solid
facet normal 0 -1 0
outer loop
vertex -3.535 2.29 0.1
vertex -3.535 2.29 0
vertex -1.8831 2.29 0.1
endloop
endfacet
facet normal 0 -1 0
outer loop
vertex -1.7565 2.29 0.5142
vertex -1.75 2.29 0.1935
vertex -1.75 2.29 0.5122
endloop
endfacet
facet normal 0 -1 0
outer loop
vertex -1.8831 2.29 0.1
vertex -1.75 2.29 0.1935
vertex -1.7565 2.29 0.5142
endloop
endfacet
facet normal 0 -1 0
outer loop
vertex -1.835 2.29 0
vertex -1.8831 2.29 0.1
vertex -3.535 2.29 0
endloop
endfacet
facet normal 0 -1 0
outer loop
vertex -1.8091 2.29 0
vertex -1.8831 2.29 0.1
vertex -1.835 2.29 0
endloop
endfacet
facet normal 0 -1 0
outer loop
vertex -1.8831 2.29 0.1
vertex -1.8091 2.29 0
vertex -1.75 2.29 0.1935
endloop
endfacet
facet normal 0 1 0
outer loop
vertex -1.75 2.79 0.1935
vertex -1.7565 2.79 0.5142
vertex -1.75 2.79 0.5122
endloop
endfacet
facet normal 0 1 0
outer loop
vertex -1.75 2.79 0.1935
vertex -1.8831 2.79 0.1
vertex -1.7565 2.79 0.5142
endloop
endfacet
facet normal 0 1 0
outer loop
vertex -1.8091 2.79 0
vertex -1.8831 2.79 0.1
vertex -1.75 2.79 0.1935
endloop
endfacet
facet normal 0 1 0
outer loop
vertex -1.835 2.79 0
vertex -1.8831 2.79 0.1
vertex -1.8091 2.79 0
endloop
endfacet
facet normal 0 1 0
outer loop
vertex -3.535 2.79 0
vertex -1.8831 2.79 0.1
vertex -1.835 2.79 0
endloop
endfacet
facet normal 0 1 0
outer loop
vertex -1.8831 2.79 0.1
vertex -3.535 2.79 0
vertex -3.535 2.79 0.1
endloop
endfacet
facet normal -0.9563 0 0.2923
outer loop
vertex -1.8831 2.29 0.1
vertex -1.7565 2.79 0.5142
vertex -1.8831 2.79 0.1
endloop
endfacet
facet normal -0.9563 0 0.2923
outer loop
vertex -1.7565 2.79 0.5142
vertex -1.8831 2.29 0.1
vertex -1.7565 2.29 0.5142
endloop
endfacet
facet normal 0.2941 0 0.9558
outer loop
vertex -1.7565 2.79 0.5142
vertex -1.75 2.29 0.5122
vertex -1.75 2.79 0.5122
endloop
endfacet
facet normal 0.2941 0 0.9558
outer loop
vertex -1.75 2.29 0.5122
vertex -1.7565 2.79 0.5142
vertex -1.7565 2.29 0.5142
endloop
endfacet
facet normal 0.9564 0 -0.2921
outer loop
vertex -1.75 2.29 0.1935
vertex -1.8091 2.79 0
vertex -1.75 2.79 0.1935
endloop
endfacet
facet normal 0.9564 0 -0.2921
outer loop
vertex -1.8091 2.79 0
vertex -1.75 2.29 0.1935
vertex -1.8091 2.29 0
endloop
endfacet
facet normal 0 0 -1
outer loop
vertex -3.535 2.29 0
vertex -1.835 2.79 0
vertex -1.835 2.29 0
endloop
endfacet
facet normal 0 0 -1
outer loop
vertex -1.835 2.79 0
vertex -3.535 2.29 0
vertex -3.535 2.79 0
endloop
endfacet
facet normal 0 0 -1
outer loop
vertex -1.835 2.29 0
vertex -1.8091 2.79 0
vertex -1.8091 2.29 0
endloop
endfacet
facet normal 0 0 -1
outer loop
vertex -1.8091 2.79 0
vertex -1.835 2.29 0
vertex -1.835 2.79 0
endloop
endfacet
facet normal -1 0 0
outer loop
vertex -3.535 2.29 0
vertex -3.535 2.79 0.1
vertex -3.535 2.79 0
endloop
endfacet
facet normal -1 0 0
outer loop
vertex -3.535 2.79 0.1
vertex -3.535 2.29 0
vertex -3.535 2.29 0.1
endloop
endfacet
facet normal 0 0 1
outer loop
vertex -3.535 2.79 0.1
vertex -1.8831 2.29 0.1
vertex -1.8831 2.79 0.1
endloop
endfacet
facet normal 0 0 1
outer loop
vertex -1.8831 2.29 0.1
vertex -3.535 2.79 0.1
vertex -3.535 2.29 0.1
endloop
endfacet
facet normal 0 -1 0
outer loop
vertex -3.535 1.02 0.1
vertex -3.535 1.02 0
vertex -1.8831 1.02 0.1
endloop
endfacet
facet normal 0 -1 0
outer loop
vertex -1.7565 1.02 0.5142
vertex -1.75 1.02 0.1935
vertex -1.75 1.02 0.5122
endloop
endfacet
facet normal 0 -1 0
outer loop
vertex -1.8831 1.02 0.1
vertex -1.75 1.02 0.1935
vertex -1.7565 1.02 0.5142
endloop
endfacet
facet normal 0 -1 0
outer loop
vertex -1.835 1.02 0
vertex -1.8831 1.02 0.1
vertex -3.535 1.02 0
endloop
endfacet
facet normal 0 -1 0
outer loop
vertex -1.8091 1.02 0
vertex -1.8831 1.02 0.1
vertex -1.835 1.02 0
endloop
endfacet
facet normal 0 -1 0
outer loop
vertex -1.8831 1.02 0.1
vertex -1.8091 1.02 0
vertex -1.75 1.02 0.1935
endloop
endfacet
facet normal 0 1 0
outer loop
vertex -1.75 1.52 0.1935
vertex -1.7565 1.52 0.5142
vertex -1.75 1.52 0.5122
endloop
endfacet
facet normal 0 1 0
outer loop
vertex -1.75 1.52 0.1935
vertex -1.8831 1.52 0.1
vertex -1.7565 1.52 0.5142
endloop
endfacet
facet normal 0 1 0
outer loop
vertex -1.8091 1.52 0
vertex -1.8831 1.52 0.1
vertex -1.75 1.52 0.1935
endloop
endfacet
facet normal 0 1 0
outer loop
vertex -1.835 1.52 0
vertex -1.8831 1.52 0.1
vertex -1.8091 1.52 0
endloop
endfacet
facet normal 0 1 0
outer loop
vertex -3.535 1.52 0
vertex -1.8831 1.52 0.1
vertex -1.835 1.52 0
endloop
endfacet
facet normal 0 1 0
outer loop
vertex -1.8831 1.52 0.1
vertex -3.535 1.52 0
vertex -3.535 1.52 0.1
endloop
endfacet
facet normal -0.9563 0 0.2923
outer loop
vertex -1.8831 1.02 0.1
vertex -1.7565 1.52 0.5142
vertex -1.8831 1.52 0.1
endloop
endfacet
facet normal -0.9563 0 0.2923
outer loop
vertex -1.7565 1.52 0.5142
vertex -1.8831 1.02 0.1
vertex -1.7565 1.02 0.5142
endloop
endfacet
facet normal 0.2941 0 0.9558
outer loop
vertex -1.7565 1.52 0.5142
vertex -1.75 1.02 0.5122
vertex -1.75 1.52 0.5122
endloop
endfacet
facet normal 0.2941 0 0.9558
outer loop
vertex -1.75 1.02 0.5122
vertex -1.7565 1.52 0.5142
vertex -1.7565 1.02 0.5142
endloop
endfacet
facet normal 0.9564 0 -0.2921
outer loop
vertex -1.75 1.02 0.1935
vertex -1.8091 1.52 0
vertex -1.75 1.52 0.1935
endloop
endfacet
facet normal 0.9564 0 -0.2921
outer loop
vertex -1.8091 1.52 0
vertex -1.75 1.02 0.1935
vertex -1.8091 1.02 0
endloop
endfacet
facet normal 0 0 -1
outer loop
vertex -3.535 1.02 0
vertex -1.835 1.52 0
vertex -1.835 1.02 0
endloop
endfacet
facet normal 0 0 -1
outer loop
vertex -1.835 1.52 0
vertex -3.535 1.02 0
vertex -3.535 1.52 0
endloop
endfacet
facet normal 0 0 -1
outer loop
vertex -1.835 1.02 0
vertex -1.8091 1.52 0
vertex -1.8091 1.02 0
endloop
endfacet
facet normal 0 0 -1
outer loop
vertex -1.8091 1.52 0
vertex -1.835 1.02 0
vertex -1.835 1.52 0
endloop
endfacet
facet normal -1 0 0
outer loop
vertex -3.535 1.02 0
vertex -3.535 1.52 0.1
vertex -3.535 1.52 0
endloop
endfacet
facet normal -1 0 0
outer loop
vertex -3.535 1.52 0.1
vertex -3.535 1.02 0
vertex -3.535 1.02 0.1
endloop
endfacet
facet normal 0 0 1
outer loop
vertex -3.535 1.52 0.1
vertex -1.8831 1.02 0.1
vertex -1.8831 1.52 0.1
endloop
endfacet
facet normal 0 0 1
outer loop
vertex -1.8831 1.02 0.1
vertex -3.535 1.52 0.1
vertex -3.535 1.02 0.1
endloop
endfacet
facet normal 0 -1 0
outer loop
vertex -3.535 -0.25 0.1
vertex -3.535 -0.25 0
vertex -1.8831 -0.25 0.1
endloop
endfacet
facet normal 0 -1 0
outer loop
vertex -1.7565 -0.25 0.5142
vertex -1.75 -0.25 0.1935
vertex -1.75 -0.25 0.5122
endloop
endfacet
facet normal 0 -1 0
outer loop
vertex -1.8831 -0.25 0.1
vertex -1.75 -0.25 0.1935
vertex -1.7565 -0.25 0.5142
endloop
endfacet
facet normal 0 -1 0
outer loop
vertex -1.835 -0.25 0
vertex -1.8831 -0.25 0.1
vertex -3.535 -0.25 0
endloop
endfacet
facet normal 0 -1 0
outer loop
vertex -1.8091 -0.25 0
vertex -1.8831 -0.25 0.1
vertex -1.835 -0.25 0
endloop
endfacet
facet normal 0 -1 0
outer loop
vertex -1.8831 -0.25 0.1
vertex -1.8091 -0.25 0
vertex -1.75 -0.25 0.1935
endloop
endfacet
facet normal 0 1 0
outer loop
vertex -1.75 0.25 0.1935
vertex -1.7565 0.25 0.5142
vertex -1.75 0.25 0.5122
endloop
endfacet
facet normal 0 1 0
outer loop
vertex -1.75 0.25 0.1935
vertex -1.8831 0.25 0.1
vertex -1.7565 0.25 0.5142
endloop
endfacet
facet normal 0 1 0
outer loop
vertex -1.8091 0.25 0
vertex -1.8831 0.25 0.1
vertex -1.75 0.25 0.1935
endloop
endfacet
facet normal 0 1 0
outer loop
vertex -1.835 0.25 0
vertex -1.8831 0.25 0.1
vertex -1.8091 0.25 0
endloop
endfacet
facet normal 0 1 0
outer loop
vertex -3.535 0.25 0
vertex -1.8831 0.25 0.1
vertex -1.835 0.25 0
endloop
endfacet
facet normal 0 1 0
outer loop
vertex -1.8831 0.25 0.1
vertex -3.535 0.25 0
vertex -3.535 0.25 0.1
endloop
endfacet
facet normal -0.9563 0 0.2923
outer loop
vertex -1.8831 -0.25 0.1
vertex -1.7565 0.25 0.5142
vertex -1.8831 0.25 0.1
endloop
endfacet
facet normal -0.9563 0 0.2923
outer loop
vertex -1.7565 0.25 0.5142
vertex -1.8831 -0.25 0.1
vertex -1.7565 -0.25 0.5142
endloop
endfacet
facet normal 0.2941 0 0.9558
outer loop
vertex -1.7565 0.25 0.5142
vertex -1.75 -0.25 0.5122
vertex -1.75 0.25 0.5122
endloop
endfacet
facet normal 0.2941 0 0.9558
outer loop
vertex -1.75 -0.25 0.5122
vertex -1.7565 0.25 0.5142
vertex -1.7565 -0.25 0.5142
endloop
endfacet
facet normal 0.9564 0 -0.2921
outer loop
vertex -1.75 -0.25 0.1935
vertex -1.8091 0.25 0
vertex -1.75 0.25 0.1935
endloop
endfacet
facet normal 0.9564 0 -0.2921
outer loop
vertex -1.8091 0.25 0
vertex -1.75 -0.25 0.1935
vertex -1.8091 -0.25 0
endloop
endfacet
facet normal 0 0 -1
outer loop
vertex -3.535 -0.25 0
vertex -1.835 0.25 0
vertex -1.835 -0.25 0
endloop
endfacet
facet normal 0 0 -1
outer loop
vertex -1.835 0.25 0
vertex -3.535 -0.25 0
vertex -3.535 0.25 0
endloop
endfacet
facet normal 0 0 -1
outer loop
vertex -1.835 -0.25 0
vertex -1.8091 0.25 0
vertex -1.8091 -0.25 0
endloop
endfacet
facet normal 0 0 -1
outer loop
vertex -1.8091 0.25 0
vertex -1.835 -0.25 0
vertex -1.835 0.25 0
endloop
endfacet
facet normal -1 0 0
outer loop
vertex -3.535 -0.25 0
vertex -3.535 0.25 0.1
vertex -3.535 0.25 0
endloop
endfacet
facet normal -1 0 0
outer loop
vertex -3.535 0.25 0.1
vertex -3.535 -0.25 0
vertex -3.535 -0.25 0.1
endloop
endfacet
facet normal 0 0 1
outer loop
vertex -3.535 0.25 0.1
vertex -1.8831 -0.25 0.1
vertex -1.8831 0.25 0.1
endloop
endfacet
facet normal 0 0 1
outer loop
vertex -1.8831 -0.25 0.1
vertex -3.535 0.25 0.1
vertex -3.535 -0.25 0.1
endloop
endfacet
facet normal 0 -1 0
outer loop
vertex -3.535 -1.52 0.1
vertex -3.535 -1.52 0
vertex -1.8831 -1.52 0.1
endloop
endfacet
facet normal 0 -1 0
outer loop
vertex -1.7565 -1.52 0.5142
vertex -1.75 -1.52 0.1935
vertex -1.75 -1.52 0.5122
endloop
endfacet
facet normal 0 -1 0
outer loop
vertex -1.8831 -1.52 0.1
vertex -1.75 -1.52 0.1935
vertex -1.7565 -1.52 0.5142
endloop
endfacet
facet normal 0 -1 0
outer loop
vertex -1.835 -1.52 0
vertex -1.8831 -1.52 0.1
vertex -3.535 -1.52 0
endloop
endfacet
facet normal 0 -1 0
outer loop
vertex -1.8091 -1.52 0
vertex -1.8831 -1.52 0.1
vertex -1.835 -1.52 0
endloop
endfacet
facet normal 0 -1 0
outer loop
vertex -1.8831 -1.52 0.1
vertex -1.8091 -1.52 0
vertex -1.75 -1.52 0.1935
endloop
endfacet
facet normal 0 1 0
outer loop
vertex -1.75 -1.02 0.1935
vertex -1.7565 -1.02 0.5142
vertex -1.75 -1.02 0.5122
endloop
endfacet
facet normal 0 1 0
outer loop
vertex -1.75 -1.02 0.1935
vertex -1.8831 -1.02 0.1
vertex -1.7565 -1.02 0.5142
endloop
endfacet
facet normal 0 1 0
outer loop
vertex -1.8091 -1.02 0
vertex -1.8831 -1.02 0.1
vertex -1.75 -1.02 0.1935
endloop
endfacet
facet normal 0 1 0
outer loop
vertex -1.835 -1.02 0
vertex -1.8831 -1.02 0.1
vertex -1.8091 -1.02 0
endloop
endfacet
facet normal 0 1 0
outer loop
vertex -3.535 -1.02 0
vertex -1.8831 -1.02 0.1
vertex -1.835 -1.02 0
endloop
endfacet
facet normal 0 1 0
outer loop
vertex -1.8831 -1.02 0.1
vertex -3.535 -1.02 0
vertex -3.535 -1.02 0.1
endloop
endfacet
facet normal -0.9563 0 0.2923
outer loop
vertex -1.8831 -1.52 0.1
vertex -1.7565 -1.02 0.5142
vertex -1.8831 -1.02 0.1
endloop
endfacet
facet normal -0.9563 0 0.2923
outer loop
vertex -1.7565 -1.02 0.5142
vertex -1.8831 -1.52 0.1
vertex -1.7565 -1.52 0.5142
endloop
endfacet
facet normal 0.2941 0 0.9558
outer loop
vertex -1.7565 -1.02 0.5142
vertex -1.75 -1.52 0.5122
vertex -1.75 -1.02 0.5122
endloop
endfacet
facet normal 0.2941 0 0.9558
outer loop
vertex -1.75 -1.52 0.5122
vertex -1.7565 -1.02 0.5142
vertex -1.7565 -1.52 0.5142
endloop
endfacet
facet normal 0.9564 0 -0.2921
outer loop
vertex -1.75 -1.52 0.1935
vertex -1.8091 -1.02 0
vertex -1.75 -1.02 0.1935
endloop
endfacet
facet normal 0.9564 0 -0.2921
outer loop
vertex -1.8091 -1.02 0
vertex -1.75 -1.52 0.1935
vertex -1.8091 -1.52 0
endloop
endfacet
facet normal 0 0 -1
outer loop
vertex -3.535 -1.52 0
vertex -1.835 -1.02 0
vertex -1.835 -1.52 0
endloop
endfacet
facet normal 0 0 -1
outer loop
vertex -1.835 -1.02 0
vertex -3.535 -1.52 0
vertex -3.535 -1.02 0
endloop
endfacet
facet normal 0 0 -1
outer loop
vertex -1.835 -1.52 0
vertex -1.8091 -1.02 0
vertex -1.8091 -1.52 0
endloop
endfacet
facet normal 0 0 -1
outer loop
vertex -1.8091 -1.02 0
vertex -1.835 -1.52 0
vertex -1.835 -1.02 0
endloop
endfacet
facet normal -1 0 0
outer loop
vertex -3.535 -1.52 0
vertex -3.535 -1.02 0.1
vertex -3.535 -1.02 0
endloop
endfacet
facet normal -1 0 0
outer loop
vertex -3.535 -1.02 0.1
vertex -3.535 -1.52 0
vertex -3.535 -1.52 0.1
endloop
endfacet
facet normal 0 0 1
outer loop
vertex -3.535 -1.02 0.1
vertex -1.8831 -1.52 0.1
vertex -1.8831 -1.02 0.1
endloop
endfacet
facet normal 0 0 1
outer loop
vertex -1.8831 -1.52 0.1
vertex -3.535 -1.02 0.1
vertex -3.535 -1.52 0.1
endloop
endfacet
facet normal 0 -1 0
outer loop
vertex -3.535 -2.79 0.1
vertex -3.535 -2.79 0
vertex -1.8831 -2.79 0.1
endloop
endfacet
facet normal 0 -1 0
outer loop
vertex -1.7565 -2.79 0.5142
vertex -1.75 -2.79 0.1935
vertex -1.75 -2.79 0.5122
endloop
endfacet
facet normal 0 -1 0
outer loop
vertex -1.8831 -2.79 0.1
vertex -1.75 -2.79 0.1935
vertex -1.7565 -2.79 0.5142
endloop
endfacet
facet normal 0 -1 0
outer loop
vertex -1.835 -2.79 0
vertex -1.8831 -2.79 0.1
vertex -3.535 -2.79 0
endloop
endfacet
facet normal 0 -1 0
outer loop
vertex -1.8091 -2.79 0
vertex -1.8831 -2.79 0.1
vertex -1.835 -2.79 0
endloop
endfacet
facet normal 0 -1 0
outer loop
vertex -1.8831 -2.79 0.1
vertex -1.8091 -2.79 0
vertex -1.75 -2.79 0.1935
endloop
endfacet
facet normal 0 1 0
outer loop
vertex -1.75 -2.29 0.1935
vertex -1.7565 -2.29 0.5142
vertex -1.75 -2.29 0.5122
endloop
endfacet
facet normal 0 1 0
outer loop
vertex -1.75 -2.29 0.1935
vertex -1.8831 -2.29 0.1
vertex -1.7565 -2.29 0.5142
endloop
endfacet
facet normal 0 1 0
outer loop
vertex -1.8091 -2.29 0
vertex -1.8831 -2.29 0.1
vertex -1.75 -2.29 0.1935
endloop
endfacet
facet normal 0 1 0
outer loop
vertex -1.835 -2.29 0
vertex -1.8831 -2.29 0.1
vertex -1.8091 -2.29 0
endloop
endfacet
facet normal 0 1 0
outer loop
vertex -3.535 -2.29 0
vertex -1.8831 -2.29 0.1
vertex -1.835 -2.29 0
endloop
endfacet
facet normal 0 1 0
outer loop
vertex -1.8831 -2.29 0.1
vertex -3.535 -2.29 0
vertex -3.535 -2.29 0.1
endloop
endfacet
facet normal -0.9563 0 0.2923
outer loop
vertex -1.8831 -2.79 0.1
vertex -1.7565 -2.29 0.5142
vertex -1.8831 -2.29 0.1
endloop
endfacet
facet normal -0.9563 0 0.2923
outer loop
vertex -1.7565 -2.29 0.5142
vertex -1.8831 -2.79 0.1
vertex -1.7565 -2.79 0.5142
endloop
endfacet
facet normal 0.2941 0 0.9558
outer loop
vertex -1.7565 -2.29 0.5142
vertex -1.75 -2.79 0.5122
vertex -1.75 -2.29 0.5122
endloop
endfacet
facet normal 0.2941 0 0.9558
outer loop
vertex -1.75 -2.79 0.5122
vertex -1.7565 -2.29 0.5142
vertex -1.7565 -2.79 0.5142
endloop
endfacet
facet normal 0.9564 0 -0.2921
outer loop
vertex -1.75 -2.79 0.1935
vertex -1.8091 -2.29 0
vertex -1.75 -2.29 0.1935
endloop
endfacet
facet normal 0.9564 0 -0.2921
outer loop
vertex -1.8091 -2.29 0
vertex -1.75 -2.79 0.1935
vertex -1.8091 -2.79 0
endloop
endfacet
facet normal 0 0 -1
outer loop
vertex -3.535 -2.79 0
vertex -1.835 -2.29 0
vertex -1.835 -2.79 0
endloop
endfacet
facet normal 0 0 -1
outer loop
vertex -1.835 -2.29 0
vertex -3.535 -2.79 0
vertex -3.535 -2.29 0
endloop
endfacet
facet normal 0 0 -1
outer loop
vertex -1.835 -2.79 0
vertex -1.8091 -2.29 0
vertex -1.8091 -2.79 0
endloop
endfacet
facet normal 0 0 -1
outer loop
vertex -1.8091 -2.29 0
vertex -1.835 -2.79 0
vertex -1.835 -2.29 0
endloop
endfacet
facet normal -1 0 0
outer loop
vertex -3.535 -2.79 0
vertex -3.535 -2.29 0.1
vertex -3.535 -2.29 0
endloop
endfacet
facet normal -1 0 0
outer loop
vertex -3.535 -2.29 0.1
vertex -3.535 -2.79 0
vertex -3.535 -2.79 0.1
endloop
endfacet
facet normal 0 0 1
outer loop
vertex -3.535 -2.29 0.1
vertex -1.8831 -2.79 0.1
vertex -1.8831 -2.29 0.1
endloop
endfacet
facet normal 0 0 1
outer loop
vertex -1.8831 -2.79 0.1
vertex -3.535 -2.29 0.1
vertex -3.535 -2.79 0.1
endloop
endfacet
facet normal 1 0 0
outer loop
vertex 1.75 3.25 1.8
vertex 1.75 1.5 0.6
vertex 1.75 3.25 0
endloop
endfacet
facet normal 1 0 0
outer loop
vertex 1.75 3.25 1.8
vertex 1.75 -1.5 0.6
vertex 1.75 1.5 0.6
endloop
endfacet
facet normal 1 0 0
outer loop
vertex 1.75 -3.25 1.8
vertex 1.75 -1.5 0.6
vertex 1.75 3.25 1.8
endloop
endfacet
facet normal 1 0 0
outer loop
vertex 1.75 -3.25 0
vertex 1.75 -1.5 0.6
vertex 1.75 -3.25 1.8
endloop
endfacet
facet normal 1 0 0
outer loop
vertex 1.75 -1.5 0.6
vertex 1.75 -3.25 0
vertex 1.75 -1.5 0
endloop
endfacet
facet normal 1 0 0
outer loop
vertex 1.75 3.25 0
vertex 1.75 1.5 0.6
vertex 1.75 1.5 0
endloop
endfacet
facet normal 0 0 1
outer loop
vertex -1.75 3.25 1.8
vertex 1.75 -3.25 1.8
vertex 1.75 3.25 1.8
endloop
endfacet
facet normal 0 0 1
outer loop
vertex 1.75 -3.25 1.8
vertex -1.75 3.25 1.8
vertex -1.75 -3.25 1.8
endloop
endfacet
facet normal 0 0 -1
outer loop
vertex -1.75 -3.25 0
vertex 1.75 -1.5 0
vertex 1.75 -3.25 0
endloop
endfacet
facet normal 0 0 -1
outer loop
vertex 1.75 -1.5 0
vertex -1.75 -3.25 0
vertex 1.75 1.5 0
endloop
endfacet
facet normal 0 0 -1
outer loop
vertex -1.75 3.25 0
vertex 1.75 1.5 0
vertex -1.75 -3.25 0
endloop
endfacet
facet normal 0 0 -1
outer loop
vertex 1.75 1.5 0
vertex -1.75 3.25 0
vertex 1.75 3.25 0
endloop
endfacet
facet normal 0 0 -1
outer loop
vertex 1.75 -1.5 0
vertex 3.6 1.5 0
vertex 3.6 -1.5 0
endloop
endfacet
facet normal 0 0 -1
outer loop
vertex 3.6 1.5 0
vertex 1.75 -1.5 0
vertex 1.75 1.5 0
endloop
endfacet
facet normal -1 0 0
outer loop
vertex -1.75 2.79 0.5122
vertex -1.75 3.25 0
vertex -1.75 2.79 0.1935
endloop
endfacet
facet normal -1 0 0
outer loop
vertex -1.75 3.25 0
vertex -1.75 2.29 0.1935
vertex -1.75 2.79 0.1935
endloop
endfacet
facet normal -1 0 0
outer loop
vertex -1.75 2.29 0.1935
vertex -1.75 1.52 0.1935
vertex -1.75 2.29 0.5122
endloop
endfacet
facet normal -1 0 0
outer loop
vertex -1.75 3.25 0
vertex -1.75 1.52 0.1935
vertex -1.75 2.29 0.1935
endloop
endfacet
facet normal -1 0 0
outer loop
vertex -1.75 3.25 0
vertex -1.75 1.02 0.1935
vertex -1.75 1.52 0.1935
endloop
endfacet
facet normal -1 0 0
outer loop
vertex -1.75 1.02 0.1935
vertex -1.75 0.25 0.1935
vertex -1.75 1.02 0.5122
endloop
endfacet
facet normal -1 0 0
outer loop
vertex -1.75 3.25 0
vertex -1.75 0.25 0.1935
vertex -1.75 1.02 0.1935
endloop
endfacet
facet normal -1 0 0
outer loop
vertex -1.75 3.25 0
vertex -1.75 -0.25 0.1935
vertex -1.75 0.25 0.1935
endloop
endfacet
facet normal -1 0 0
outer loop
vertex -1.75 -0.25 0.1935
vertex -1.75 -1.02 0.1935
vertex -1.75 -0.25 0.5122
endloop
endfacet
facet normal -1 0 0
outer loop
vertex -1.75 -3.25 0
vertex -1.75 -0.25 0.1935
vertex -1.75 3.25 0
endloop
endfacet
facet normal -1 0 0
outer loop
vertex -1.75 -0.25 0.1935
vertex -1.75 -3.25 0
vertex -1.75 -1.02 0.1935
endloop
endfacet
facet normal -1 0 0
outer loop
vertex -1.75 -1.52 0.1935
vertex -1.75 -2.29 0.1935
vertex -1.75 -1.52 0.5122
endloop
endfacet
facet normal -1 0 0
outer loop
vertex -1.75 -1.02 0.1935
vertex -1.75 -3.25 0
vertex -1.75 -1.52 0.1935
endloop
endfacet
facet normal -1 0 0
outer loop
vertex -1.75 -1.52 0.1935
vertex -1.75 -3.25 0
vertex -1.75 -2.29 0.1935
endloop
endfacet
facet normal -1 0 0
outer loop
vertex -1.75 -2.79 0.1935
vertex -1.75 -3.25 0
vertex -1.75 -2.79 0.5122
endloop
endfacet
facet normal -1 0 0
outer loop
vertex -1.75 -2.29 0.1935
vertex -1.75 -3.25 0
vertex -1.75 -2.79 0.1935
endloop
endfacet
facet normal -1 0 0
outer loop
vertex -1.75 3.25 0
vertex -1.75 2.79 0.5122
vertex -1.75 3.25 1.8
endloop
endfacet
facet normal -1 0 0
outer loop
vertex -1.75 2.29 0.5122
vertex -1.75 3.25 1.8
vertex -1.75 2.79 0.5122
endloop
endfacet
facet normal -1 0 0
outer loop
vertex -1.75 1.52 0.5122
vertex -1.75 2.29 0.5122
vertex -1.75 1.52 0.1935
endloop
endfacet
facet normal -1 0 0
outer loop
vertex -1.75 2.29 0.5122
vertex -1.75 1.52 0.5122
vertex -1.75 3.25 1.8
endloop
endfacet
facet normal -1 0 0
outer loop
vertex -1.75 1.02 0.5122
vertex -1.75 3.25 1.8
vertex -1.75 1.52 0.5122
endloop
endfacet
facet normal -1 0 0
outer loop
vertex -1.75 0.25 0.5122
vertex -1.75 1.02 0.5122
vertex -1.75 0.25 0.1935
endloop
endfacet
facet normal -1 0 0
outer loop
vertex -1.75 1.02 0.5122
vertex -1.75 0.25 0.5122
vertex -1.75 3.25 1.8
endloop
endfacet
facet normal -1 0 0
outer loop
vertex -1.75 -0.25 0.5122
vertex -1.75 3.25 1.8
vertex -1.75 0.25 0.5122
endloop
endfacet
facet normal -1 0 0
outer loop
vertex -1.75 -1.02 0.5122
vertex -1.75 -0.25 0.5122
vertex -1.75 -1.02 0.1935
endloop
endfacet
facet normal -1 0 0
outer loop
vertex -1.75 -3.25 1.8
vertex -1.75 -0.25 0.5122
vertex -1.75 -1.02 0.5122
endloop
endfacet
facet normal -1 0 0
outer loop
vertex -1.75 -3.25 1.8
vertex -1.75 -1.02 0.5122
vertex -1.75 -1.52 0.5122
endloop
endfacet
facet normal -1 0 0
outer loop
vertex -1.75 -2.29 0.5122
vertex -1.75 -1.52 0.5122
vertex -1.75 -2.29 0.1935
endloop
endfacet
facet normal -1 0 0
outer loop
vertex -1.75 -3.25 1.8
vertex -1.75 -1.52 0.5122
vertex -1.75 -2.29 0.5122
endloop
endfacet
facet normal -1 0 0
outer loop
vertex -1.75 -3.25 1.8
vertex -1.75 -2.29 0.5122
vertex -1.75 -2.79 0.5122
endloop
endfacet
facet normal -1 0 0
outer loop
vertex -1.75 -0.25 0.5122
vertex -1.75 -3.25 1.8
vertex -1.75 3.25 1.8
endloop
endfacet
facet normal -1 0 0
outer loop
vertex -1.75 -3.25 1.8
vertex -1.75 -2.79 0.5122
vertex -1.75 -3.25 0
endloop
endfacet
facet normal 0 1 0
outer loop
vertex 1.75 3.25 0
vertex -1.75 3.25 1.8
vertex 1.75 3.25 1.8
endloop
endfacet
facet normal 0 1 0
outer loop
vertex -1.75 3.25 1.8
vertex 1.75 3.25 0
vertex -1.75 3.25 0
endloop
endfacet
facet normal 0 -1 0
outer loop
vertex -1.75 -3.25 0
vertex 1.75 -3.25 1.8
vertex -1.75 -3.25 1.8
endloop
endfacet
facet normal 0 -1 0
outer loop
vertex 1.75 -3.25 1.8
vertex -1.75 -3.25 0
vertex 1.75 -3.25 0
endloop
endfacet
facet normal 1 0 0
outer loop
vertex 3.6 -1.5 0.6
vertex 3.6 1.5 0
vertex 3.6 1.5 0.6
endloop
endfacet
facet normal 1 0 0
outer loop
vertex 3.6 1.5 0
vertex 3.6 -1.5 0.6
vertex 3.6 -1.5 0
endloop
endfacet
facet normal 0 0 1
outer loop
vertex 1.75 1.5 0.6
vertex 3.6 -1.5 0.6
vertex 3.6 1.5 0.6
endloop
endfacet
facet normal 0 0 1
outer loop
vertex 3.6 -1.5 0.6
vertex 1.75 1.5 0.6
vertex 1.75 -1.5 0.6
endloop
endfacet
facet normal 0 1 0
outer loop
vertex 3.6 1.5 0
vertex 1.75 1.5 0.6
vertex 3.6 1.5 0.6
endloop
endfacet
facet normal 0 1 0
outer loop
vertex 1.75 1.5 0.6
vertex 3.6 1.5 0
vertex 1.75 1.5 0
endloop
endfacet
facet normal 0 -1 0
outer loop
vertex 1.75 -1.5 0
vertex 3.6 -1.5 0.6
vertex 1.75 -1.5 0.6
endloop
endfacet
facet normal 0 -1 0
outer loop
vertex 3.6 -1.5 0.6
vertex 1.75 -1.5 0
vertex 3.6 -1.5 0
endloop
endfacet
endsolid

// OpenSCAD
//Body
translate(v=[0,0,1.80/2]) cube(size=[3.50,6.50,1.80],center=true);

//Major Pin
translate(v=[1.85/2+3.5/2,0,.3]) cube(size=[1.85,3.0,.6],center=true);

module pin() {
	translate(v = [1.85/2+.01,0,.1/2]) cube(size=[1.85-.15,.5,.1], center=true);
	difference() {
	translate(v=[.15/2-.04,0,.5/2]) rotate(a = 73, v= [0,1,0]) cube(size=[.522,.5,.1], center=true);
	
	translate(v=[0,0,-10]) cube(size = 20, center = true);
	}
}

module side_of_pins() {
	translate(v=[3.5/2,-(1.27*4)/2 + 0,0]){
	for(z=[0:4]) {
		translate(v=[0,z*1.27,0]) pin();
	}
}
}

rotate(a=180,v=[0,0,1])side_of_pins();
